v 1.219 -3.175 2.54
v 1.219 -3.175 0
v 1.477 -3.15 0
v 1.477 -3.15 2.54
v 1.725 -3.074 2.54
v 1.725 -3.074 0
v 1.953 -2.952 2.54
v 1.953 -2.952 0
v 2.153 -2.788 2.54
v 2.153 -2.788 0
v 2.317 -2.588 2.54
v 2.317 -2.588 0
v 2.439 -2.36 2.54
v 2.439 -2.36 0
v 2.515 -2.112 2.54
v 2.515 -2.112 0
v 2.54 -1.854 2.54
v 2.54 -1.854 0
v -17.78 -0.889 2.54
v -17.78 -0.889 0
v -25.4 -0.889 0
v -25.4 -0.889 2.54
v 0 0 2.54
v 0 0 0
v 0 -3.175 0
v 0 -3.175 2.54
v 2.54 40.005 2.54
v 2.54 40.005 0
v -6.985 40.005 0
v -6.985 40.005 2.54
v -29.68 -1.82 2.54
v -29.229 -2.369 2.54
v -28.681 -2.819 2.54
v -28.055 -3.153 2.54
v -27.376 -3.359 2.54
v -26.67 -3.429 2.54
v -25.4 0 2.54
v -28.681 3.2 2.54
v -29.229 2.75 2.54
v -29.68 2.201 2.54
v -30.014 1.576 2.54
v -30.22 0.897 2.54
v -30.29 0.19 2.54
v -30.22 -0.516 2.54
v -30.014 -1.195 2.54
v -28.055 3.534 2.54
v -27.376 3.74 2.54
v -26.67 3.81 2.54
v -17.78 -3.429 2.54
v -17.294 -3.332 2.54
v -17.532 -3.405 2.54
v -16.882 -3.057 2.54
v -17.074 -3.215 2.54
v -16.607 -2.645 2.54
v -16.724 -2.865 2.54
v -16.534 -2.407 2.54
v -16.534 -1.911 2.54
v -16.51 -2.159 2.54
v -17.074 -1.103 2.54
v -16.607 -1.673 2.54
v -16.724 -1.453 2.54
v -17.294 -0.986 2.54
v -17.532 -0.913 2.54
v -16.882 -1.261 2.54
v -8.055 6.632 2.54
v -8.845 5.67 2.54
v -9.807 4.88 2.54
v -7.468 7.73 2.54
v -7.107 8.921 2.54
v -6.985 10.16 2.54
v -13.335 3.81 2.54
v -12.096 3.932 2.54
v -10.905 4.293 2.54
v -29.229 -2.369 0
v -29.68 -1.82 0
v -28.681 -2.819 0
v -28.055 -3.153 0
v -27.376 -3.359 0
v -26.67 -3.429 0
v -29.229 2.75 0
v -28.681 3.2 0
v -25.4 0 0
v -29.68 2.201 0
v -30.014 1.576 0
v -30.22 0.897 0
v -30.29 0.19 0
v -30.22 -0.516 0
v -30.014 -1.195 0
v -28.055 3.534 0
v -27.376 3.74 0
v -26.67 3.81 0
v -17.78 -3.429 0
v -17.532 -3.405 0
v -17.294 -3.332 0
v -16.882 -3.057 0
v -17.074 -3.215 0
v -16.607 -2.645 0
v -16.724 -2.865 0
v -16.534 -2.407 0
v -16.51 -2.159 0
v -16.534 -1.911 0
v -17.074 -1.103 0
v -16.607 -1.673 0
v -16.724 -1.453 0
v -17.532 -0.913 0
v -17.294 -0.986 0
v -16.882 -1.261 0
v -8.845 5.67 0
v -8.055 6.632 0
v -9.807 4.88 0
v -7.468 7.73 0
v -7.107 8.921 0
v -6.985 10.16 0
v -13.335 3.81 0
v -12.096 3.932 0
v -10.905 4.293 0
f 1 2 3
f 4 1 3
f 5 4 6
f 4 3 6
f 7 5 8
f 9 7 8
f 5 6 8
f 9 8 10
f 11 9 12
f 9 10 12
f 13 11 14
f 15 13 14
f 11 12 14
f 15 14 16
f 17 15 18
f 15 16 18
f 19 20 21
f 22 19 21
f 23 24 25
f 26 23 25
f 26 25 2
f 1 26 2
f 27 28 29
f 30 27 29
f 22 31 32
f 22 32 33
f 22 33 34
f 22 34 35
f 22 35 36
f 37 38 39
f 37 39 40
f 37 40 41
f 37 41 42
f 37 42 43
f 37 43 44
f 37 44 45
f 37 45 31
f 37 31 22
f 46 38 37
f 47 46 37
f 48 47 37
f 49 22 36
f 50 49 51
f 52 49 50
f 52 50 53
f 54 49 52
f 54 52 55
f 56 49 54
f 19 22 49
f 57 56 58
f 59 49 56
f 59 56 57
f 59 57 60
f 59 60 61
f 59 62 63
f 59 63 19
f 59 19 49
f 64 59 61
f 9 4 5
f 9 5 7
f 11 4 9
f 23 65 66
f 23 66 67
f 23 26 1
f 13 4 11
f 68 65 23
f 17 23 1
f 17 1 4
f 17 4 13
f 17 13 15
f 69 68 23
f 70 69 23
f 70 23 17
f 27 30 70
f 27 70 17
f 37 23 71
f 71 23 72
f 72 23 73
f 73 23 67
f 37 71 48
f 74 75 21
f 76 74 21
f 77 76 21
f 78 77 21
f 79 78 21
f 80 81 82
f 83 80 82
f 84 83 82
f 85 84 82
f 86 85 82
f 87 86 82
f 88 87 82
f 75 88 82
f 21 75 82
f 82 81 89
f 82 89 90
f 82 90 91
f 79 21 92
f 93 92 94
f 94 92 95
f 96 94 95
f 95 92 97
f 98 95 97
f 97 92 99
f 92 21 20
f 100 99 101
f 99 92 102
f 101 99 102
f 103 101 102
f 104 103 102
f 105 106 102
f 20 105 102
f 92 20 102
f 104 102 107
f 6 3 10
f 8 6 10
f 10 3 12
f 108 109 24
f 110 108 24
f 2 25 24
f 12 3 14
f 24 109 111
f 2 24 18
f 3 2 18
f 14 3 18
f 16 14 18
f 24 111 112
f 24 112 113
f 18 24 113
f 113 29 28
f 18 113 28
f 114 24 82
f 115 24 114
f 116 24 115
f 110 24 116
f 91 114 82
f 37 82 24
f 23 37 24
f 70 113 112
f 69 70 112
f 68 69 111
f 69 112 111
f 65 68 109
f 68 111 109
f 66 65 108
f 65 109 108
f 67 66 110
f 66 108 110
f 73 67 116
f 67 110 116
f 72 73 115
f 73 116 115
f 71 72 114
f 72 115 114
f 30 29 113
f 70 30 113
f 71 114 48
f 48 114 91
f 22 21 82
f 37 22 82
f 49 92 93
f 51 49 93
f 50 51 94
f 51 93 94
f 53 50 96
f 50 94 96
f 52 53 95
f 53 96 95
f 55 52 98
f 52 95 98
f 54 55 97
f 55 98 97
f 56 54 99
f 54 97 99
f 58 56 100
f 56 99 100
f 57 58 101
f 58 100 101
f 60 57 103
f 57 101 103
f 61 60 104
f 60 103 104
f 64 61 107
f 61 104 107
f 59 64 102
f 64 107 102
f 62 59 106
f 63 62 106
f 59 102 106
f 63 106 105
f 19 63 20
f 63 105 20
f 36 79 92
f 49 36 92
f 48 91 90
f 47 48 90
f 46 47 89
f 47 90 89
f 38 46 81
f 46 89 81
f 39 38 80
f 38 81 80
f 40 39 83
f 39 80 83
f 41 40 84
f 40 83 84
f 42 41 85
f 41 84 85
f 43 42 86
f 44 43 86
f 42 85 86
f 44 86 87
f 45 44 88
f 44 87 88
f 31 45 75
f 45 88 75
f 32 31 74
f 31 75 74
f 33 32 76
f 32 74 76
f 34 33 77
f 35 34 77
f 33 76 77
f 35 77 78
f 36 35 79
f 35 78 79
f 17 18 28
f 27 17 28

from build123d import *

# Parameters (mm, degrees)
F1_DEPTH = 2.54


with BuildPart() as f1:
    # F0 (on Top) → F1 (new body)
    with BuildSketch(Plane.XY):
        with BuildLine():
            Line((2.54, 40.005), (-6.985, 40.005))
            Line((-6.985, 40.005), (-6.985, 10.16))
            ThreePointArc((-6.985, 10.16), (-8.844872, 5.669872), (-13.335, 3.81))
            Line((-13.335, 3.81), (-26.67, 3.81))
            ThreePointArc((-26.67, 3.81), (-30.2895, 0.1905), (-26.67, -3.429))
            Line((-26.67, -3.429), (-17.78, -3.429))
            ThreePointArc((-17.78, -3.429), (-16.51, -2.159), (-17.78, -0.889))
            Line((-17.78, -0.889), (-25.4, -0.889))
            Line((-25.4, -0.889), (-25.4, 0))
            Line((-25.4, 0), (0, 0))
            Line((0, 0), (0, -3.175))
            Line((0, -3.175), (1.2192, -3.175))
            ThreePointArc((1.2192, -3.175), (2.153147, -2.788147), (2.54, -1.8542))
            Line((2.54, -1.8542), (2.54, 40.005))
        make_face()
    extrude(amount=F1_DEPTH)


solid = f1.part
